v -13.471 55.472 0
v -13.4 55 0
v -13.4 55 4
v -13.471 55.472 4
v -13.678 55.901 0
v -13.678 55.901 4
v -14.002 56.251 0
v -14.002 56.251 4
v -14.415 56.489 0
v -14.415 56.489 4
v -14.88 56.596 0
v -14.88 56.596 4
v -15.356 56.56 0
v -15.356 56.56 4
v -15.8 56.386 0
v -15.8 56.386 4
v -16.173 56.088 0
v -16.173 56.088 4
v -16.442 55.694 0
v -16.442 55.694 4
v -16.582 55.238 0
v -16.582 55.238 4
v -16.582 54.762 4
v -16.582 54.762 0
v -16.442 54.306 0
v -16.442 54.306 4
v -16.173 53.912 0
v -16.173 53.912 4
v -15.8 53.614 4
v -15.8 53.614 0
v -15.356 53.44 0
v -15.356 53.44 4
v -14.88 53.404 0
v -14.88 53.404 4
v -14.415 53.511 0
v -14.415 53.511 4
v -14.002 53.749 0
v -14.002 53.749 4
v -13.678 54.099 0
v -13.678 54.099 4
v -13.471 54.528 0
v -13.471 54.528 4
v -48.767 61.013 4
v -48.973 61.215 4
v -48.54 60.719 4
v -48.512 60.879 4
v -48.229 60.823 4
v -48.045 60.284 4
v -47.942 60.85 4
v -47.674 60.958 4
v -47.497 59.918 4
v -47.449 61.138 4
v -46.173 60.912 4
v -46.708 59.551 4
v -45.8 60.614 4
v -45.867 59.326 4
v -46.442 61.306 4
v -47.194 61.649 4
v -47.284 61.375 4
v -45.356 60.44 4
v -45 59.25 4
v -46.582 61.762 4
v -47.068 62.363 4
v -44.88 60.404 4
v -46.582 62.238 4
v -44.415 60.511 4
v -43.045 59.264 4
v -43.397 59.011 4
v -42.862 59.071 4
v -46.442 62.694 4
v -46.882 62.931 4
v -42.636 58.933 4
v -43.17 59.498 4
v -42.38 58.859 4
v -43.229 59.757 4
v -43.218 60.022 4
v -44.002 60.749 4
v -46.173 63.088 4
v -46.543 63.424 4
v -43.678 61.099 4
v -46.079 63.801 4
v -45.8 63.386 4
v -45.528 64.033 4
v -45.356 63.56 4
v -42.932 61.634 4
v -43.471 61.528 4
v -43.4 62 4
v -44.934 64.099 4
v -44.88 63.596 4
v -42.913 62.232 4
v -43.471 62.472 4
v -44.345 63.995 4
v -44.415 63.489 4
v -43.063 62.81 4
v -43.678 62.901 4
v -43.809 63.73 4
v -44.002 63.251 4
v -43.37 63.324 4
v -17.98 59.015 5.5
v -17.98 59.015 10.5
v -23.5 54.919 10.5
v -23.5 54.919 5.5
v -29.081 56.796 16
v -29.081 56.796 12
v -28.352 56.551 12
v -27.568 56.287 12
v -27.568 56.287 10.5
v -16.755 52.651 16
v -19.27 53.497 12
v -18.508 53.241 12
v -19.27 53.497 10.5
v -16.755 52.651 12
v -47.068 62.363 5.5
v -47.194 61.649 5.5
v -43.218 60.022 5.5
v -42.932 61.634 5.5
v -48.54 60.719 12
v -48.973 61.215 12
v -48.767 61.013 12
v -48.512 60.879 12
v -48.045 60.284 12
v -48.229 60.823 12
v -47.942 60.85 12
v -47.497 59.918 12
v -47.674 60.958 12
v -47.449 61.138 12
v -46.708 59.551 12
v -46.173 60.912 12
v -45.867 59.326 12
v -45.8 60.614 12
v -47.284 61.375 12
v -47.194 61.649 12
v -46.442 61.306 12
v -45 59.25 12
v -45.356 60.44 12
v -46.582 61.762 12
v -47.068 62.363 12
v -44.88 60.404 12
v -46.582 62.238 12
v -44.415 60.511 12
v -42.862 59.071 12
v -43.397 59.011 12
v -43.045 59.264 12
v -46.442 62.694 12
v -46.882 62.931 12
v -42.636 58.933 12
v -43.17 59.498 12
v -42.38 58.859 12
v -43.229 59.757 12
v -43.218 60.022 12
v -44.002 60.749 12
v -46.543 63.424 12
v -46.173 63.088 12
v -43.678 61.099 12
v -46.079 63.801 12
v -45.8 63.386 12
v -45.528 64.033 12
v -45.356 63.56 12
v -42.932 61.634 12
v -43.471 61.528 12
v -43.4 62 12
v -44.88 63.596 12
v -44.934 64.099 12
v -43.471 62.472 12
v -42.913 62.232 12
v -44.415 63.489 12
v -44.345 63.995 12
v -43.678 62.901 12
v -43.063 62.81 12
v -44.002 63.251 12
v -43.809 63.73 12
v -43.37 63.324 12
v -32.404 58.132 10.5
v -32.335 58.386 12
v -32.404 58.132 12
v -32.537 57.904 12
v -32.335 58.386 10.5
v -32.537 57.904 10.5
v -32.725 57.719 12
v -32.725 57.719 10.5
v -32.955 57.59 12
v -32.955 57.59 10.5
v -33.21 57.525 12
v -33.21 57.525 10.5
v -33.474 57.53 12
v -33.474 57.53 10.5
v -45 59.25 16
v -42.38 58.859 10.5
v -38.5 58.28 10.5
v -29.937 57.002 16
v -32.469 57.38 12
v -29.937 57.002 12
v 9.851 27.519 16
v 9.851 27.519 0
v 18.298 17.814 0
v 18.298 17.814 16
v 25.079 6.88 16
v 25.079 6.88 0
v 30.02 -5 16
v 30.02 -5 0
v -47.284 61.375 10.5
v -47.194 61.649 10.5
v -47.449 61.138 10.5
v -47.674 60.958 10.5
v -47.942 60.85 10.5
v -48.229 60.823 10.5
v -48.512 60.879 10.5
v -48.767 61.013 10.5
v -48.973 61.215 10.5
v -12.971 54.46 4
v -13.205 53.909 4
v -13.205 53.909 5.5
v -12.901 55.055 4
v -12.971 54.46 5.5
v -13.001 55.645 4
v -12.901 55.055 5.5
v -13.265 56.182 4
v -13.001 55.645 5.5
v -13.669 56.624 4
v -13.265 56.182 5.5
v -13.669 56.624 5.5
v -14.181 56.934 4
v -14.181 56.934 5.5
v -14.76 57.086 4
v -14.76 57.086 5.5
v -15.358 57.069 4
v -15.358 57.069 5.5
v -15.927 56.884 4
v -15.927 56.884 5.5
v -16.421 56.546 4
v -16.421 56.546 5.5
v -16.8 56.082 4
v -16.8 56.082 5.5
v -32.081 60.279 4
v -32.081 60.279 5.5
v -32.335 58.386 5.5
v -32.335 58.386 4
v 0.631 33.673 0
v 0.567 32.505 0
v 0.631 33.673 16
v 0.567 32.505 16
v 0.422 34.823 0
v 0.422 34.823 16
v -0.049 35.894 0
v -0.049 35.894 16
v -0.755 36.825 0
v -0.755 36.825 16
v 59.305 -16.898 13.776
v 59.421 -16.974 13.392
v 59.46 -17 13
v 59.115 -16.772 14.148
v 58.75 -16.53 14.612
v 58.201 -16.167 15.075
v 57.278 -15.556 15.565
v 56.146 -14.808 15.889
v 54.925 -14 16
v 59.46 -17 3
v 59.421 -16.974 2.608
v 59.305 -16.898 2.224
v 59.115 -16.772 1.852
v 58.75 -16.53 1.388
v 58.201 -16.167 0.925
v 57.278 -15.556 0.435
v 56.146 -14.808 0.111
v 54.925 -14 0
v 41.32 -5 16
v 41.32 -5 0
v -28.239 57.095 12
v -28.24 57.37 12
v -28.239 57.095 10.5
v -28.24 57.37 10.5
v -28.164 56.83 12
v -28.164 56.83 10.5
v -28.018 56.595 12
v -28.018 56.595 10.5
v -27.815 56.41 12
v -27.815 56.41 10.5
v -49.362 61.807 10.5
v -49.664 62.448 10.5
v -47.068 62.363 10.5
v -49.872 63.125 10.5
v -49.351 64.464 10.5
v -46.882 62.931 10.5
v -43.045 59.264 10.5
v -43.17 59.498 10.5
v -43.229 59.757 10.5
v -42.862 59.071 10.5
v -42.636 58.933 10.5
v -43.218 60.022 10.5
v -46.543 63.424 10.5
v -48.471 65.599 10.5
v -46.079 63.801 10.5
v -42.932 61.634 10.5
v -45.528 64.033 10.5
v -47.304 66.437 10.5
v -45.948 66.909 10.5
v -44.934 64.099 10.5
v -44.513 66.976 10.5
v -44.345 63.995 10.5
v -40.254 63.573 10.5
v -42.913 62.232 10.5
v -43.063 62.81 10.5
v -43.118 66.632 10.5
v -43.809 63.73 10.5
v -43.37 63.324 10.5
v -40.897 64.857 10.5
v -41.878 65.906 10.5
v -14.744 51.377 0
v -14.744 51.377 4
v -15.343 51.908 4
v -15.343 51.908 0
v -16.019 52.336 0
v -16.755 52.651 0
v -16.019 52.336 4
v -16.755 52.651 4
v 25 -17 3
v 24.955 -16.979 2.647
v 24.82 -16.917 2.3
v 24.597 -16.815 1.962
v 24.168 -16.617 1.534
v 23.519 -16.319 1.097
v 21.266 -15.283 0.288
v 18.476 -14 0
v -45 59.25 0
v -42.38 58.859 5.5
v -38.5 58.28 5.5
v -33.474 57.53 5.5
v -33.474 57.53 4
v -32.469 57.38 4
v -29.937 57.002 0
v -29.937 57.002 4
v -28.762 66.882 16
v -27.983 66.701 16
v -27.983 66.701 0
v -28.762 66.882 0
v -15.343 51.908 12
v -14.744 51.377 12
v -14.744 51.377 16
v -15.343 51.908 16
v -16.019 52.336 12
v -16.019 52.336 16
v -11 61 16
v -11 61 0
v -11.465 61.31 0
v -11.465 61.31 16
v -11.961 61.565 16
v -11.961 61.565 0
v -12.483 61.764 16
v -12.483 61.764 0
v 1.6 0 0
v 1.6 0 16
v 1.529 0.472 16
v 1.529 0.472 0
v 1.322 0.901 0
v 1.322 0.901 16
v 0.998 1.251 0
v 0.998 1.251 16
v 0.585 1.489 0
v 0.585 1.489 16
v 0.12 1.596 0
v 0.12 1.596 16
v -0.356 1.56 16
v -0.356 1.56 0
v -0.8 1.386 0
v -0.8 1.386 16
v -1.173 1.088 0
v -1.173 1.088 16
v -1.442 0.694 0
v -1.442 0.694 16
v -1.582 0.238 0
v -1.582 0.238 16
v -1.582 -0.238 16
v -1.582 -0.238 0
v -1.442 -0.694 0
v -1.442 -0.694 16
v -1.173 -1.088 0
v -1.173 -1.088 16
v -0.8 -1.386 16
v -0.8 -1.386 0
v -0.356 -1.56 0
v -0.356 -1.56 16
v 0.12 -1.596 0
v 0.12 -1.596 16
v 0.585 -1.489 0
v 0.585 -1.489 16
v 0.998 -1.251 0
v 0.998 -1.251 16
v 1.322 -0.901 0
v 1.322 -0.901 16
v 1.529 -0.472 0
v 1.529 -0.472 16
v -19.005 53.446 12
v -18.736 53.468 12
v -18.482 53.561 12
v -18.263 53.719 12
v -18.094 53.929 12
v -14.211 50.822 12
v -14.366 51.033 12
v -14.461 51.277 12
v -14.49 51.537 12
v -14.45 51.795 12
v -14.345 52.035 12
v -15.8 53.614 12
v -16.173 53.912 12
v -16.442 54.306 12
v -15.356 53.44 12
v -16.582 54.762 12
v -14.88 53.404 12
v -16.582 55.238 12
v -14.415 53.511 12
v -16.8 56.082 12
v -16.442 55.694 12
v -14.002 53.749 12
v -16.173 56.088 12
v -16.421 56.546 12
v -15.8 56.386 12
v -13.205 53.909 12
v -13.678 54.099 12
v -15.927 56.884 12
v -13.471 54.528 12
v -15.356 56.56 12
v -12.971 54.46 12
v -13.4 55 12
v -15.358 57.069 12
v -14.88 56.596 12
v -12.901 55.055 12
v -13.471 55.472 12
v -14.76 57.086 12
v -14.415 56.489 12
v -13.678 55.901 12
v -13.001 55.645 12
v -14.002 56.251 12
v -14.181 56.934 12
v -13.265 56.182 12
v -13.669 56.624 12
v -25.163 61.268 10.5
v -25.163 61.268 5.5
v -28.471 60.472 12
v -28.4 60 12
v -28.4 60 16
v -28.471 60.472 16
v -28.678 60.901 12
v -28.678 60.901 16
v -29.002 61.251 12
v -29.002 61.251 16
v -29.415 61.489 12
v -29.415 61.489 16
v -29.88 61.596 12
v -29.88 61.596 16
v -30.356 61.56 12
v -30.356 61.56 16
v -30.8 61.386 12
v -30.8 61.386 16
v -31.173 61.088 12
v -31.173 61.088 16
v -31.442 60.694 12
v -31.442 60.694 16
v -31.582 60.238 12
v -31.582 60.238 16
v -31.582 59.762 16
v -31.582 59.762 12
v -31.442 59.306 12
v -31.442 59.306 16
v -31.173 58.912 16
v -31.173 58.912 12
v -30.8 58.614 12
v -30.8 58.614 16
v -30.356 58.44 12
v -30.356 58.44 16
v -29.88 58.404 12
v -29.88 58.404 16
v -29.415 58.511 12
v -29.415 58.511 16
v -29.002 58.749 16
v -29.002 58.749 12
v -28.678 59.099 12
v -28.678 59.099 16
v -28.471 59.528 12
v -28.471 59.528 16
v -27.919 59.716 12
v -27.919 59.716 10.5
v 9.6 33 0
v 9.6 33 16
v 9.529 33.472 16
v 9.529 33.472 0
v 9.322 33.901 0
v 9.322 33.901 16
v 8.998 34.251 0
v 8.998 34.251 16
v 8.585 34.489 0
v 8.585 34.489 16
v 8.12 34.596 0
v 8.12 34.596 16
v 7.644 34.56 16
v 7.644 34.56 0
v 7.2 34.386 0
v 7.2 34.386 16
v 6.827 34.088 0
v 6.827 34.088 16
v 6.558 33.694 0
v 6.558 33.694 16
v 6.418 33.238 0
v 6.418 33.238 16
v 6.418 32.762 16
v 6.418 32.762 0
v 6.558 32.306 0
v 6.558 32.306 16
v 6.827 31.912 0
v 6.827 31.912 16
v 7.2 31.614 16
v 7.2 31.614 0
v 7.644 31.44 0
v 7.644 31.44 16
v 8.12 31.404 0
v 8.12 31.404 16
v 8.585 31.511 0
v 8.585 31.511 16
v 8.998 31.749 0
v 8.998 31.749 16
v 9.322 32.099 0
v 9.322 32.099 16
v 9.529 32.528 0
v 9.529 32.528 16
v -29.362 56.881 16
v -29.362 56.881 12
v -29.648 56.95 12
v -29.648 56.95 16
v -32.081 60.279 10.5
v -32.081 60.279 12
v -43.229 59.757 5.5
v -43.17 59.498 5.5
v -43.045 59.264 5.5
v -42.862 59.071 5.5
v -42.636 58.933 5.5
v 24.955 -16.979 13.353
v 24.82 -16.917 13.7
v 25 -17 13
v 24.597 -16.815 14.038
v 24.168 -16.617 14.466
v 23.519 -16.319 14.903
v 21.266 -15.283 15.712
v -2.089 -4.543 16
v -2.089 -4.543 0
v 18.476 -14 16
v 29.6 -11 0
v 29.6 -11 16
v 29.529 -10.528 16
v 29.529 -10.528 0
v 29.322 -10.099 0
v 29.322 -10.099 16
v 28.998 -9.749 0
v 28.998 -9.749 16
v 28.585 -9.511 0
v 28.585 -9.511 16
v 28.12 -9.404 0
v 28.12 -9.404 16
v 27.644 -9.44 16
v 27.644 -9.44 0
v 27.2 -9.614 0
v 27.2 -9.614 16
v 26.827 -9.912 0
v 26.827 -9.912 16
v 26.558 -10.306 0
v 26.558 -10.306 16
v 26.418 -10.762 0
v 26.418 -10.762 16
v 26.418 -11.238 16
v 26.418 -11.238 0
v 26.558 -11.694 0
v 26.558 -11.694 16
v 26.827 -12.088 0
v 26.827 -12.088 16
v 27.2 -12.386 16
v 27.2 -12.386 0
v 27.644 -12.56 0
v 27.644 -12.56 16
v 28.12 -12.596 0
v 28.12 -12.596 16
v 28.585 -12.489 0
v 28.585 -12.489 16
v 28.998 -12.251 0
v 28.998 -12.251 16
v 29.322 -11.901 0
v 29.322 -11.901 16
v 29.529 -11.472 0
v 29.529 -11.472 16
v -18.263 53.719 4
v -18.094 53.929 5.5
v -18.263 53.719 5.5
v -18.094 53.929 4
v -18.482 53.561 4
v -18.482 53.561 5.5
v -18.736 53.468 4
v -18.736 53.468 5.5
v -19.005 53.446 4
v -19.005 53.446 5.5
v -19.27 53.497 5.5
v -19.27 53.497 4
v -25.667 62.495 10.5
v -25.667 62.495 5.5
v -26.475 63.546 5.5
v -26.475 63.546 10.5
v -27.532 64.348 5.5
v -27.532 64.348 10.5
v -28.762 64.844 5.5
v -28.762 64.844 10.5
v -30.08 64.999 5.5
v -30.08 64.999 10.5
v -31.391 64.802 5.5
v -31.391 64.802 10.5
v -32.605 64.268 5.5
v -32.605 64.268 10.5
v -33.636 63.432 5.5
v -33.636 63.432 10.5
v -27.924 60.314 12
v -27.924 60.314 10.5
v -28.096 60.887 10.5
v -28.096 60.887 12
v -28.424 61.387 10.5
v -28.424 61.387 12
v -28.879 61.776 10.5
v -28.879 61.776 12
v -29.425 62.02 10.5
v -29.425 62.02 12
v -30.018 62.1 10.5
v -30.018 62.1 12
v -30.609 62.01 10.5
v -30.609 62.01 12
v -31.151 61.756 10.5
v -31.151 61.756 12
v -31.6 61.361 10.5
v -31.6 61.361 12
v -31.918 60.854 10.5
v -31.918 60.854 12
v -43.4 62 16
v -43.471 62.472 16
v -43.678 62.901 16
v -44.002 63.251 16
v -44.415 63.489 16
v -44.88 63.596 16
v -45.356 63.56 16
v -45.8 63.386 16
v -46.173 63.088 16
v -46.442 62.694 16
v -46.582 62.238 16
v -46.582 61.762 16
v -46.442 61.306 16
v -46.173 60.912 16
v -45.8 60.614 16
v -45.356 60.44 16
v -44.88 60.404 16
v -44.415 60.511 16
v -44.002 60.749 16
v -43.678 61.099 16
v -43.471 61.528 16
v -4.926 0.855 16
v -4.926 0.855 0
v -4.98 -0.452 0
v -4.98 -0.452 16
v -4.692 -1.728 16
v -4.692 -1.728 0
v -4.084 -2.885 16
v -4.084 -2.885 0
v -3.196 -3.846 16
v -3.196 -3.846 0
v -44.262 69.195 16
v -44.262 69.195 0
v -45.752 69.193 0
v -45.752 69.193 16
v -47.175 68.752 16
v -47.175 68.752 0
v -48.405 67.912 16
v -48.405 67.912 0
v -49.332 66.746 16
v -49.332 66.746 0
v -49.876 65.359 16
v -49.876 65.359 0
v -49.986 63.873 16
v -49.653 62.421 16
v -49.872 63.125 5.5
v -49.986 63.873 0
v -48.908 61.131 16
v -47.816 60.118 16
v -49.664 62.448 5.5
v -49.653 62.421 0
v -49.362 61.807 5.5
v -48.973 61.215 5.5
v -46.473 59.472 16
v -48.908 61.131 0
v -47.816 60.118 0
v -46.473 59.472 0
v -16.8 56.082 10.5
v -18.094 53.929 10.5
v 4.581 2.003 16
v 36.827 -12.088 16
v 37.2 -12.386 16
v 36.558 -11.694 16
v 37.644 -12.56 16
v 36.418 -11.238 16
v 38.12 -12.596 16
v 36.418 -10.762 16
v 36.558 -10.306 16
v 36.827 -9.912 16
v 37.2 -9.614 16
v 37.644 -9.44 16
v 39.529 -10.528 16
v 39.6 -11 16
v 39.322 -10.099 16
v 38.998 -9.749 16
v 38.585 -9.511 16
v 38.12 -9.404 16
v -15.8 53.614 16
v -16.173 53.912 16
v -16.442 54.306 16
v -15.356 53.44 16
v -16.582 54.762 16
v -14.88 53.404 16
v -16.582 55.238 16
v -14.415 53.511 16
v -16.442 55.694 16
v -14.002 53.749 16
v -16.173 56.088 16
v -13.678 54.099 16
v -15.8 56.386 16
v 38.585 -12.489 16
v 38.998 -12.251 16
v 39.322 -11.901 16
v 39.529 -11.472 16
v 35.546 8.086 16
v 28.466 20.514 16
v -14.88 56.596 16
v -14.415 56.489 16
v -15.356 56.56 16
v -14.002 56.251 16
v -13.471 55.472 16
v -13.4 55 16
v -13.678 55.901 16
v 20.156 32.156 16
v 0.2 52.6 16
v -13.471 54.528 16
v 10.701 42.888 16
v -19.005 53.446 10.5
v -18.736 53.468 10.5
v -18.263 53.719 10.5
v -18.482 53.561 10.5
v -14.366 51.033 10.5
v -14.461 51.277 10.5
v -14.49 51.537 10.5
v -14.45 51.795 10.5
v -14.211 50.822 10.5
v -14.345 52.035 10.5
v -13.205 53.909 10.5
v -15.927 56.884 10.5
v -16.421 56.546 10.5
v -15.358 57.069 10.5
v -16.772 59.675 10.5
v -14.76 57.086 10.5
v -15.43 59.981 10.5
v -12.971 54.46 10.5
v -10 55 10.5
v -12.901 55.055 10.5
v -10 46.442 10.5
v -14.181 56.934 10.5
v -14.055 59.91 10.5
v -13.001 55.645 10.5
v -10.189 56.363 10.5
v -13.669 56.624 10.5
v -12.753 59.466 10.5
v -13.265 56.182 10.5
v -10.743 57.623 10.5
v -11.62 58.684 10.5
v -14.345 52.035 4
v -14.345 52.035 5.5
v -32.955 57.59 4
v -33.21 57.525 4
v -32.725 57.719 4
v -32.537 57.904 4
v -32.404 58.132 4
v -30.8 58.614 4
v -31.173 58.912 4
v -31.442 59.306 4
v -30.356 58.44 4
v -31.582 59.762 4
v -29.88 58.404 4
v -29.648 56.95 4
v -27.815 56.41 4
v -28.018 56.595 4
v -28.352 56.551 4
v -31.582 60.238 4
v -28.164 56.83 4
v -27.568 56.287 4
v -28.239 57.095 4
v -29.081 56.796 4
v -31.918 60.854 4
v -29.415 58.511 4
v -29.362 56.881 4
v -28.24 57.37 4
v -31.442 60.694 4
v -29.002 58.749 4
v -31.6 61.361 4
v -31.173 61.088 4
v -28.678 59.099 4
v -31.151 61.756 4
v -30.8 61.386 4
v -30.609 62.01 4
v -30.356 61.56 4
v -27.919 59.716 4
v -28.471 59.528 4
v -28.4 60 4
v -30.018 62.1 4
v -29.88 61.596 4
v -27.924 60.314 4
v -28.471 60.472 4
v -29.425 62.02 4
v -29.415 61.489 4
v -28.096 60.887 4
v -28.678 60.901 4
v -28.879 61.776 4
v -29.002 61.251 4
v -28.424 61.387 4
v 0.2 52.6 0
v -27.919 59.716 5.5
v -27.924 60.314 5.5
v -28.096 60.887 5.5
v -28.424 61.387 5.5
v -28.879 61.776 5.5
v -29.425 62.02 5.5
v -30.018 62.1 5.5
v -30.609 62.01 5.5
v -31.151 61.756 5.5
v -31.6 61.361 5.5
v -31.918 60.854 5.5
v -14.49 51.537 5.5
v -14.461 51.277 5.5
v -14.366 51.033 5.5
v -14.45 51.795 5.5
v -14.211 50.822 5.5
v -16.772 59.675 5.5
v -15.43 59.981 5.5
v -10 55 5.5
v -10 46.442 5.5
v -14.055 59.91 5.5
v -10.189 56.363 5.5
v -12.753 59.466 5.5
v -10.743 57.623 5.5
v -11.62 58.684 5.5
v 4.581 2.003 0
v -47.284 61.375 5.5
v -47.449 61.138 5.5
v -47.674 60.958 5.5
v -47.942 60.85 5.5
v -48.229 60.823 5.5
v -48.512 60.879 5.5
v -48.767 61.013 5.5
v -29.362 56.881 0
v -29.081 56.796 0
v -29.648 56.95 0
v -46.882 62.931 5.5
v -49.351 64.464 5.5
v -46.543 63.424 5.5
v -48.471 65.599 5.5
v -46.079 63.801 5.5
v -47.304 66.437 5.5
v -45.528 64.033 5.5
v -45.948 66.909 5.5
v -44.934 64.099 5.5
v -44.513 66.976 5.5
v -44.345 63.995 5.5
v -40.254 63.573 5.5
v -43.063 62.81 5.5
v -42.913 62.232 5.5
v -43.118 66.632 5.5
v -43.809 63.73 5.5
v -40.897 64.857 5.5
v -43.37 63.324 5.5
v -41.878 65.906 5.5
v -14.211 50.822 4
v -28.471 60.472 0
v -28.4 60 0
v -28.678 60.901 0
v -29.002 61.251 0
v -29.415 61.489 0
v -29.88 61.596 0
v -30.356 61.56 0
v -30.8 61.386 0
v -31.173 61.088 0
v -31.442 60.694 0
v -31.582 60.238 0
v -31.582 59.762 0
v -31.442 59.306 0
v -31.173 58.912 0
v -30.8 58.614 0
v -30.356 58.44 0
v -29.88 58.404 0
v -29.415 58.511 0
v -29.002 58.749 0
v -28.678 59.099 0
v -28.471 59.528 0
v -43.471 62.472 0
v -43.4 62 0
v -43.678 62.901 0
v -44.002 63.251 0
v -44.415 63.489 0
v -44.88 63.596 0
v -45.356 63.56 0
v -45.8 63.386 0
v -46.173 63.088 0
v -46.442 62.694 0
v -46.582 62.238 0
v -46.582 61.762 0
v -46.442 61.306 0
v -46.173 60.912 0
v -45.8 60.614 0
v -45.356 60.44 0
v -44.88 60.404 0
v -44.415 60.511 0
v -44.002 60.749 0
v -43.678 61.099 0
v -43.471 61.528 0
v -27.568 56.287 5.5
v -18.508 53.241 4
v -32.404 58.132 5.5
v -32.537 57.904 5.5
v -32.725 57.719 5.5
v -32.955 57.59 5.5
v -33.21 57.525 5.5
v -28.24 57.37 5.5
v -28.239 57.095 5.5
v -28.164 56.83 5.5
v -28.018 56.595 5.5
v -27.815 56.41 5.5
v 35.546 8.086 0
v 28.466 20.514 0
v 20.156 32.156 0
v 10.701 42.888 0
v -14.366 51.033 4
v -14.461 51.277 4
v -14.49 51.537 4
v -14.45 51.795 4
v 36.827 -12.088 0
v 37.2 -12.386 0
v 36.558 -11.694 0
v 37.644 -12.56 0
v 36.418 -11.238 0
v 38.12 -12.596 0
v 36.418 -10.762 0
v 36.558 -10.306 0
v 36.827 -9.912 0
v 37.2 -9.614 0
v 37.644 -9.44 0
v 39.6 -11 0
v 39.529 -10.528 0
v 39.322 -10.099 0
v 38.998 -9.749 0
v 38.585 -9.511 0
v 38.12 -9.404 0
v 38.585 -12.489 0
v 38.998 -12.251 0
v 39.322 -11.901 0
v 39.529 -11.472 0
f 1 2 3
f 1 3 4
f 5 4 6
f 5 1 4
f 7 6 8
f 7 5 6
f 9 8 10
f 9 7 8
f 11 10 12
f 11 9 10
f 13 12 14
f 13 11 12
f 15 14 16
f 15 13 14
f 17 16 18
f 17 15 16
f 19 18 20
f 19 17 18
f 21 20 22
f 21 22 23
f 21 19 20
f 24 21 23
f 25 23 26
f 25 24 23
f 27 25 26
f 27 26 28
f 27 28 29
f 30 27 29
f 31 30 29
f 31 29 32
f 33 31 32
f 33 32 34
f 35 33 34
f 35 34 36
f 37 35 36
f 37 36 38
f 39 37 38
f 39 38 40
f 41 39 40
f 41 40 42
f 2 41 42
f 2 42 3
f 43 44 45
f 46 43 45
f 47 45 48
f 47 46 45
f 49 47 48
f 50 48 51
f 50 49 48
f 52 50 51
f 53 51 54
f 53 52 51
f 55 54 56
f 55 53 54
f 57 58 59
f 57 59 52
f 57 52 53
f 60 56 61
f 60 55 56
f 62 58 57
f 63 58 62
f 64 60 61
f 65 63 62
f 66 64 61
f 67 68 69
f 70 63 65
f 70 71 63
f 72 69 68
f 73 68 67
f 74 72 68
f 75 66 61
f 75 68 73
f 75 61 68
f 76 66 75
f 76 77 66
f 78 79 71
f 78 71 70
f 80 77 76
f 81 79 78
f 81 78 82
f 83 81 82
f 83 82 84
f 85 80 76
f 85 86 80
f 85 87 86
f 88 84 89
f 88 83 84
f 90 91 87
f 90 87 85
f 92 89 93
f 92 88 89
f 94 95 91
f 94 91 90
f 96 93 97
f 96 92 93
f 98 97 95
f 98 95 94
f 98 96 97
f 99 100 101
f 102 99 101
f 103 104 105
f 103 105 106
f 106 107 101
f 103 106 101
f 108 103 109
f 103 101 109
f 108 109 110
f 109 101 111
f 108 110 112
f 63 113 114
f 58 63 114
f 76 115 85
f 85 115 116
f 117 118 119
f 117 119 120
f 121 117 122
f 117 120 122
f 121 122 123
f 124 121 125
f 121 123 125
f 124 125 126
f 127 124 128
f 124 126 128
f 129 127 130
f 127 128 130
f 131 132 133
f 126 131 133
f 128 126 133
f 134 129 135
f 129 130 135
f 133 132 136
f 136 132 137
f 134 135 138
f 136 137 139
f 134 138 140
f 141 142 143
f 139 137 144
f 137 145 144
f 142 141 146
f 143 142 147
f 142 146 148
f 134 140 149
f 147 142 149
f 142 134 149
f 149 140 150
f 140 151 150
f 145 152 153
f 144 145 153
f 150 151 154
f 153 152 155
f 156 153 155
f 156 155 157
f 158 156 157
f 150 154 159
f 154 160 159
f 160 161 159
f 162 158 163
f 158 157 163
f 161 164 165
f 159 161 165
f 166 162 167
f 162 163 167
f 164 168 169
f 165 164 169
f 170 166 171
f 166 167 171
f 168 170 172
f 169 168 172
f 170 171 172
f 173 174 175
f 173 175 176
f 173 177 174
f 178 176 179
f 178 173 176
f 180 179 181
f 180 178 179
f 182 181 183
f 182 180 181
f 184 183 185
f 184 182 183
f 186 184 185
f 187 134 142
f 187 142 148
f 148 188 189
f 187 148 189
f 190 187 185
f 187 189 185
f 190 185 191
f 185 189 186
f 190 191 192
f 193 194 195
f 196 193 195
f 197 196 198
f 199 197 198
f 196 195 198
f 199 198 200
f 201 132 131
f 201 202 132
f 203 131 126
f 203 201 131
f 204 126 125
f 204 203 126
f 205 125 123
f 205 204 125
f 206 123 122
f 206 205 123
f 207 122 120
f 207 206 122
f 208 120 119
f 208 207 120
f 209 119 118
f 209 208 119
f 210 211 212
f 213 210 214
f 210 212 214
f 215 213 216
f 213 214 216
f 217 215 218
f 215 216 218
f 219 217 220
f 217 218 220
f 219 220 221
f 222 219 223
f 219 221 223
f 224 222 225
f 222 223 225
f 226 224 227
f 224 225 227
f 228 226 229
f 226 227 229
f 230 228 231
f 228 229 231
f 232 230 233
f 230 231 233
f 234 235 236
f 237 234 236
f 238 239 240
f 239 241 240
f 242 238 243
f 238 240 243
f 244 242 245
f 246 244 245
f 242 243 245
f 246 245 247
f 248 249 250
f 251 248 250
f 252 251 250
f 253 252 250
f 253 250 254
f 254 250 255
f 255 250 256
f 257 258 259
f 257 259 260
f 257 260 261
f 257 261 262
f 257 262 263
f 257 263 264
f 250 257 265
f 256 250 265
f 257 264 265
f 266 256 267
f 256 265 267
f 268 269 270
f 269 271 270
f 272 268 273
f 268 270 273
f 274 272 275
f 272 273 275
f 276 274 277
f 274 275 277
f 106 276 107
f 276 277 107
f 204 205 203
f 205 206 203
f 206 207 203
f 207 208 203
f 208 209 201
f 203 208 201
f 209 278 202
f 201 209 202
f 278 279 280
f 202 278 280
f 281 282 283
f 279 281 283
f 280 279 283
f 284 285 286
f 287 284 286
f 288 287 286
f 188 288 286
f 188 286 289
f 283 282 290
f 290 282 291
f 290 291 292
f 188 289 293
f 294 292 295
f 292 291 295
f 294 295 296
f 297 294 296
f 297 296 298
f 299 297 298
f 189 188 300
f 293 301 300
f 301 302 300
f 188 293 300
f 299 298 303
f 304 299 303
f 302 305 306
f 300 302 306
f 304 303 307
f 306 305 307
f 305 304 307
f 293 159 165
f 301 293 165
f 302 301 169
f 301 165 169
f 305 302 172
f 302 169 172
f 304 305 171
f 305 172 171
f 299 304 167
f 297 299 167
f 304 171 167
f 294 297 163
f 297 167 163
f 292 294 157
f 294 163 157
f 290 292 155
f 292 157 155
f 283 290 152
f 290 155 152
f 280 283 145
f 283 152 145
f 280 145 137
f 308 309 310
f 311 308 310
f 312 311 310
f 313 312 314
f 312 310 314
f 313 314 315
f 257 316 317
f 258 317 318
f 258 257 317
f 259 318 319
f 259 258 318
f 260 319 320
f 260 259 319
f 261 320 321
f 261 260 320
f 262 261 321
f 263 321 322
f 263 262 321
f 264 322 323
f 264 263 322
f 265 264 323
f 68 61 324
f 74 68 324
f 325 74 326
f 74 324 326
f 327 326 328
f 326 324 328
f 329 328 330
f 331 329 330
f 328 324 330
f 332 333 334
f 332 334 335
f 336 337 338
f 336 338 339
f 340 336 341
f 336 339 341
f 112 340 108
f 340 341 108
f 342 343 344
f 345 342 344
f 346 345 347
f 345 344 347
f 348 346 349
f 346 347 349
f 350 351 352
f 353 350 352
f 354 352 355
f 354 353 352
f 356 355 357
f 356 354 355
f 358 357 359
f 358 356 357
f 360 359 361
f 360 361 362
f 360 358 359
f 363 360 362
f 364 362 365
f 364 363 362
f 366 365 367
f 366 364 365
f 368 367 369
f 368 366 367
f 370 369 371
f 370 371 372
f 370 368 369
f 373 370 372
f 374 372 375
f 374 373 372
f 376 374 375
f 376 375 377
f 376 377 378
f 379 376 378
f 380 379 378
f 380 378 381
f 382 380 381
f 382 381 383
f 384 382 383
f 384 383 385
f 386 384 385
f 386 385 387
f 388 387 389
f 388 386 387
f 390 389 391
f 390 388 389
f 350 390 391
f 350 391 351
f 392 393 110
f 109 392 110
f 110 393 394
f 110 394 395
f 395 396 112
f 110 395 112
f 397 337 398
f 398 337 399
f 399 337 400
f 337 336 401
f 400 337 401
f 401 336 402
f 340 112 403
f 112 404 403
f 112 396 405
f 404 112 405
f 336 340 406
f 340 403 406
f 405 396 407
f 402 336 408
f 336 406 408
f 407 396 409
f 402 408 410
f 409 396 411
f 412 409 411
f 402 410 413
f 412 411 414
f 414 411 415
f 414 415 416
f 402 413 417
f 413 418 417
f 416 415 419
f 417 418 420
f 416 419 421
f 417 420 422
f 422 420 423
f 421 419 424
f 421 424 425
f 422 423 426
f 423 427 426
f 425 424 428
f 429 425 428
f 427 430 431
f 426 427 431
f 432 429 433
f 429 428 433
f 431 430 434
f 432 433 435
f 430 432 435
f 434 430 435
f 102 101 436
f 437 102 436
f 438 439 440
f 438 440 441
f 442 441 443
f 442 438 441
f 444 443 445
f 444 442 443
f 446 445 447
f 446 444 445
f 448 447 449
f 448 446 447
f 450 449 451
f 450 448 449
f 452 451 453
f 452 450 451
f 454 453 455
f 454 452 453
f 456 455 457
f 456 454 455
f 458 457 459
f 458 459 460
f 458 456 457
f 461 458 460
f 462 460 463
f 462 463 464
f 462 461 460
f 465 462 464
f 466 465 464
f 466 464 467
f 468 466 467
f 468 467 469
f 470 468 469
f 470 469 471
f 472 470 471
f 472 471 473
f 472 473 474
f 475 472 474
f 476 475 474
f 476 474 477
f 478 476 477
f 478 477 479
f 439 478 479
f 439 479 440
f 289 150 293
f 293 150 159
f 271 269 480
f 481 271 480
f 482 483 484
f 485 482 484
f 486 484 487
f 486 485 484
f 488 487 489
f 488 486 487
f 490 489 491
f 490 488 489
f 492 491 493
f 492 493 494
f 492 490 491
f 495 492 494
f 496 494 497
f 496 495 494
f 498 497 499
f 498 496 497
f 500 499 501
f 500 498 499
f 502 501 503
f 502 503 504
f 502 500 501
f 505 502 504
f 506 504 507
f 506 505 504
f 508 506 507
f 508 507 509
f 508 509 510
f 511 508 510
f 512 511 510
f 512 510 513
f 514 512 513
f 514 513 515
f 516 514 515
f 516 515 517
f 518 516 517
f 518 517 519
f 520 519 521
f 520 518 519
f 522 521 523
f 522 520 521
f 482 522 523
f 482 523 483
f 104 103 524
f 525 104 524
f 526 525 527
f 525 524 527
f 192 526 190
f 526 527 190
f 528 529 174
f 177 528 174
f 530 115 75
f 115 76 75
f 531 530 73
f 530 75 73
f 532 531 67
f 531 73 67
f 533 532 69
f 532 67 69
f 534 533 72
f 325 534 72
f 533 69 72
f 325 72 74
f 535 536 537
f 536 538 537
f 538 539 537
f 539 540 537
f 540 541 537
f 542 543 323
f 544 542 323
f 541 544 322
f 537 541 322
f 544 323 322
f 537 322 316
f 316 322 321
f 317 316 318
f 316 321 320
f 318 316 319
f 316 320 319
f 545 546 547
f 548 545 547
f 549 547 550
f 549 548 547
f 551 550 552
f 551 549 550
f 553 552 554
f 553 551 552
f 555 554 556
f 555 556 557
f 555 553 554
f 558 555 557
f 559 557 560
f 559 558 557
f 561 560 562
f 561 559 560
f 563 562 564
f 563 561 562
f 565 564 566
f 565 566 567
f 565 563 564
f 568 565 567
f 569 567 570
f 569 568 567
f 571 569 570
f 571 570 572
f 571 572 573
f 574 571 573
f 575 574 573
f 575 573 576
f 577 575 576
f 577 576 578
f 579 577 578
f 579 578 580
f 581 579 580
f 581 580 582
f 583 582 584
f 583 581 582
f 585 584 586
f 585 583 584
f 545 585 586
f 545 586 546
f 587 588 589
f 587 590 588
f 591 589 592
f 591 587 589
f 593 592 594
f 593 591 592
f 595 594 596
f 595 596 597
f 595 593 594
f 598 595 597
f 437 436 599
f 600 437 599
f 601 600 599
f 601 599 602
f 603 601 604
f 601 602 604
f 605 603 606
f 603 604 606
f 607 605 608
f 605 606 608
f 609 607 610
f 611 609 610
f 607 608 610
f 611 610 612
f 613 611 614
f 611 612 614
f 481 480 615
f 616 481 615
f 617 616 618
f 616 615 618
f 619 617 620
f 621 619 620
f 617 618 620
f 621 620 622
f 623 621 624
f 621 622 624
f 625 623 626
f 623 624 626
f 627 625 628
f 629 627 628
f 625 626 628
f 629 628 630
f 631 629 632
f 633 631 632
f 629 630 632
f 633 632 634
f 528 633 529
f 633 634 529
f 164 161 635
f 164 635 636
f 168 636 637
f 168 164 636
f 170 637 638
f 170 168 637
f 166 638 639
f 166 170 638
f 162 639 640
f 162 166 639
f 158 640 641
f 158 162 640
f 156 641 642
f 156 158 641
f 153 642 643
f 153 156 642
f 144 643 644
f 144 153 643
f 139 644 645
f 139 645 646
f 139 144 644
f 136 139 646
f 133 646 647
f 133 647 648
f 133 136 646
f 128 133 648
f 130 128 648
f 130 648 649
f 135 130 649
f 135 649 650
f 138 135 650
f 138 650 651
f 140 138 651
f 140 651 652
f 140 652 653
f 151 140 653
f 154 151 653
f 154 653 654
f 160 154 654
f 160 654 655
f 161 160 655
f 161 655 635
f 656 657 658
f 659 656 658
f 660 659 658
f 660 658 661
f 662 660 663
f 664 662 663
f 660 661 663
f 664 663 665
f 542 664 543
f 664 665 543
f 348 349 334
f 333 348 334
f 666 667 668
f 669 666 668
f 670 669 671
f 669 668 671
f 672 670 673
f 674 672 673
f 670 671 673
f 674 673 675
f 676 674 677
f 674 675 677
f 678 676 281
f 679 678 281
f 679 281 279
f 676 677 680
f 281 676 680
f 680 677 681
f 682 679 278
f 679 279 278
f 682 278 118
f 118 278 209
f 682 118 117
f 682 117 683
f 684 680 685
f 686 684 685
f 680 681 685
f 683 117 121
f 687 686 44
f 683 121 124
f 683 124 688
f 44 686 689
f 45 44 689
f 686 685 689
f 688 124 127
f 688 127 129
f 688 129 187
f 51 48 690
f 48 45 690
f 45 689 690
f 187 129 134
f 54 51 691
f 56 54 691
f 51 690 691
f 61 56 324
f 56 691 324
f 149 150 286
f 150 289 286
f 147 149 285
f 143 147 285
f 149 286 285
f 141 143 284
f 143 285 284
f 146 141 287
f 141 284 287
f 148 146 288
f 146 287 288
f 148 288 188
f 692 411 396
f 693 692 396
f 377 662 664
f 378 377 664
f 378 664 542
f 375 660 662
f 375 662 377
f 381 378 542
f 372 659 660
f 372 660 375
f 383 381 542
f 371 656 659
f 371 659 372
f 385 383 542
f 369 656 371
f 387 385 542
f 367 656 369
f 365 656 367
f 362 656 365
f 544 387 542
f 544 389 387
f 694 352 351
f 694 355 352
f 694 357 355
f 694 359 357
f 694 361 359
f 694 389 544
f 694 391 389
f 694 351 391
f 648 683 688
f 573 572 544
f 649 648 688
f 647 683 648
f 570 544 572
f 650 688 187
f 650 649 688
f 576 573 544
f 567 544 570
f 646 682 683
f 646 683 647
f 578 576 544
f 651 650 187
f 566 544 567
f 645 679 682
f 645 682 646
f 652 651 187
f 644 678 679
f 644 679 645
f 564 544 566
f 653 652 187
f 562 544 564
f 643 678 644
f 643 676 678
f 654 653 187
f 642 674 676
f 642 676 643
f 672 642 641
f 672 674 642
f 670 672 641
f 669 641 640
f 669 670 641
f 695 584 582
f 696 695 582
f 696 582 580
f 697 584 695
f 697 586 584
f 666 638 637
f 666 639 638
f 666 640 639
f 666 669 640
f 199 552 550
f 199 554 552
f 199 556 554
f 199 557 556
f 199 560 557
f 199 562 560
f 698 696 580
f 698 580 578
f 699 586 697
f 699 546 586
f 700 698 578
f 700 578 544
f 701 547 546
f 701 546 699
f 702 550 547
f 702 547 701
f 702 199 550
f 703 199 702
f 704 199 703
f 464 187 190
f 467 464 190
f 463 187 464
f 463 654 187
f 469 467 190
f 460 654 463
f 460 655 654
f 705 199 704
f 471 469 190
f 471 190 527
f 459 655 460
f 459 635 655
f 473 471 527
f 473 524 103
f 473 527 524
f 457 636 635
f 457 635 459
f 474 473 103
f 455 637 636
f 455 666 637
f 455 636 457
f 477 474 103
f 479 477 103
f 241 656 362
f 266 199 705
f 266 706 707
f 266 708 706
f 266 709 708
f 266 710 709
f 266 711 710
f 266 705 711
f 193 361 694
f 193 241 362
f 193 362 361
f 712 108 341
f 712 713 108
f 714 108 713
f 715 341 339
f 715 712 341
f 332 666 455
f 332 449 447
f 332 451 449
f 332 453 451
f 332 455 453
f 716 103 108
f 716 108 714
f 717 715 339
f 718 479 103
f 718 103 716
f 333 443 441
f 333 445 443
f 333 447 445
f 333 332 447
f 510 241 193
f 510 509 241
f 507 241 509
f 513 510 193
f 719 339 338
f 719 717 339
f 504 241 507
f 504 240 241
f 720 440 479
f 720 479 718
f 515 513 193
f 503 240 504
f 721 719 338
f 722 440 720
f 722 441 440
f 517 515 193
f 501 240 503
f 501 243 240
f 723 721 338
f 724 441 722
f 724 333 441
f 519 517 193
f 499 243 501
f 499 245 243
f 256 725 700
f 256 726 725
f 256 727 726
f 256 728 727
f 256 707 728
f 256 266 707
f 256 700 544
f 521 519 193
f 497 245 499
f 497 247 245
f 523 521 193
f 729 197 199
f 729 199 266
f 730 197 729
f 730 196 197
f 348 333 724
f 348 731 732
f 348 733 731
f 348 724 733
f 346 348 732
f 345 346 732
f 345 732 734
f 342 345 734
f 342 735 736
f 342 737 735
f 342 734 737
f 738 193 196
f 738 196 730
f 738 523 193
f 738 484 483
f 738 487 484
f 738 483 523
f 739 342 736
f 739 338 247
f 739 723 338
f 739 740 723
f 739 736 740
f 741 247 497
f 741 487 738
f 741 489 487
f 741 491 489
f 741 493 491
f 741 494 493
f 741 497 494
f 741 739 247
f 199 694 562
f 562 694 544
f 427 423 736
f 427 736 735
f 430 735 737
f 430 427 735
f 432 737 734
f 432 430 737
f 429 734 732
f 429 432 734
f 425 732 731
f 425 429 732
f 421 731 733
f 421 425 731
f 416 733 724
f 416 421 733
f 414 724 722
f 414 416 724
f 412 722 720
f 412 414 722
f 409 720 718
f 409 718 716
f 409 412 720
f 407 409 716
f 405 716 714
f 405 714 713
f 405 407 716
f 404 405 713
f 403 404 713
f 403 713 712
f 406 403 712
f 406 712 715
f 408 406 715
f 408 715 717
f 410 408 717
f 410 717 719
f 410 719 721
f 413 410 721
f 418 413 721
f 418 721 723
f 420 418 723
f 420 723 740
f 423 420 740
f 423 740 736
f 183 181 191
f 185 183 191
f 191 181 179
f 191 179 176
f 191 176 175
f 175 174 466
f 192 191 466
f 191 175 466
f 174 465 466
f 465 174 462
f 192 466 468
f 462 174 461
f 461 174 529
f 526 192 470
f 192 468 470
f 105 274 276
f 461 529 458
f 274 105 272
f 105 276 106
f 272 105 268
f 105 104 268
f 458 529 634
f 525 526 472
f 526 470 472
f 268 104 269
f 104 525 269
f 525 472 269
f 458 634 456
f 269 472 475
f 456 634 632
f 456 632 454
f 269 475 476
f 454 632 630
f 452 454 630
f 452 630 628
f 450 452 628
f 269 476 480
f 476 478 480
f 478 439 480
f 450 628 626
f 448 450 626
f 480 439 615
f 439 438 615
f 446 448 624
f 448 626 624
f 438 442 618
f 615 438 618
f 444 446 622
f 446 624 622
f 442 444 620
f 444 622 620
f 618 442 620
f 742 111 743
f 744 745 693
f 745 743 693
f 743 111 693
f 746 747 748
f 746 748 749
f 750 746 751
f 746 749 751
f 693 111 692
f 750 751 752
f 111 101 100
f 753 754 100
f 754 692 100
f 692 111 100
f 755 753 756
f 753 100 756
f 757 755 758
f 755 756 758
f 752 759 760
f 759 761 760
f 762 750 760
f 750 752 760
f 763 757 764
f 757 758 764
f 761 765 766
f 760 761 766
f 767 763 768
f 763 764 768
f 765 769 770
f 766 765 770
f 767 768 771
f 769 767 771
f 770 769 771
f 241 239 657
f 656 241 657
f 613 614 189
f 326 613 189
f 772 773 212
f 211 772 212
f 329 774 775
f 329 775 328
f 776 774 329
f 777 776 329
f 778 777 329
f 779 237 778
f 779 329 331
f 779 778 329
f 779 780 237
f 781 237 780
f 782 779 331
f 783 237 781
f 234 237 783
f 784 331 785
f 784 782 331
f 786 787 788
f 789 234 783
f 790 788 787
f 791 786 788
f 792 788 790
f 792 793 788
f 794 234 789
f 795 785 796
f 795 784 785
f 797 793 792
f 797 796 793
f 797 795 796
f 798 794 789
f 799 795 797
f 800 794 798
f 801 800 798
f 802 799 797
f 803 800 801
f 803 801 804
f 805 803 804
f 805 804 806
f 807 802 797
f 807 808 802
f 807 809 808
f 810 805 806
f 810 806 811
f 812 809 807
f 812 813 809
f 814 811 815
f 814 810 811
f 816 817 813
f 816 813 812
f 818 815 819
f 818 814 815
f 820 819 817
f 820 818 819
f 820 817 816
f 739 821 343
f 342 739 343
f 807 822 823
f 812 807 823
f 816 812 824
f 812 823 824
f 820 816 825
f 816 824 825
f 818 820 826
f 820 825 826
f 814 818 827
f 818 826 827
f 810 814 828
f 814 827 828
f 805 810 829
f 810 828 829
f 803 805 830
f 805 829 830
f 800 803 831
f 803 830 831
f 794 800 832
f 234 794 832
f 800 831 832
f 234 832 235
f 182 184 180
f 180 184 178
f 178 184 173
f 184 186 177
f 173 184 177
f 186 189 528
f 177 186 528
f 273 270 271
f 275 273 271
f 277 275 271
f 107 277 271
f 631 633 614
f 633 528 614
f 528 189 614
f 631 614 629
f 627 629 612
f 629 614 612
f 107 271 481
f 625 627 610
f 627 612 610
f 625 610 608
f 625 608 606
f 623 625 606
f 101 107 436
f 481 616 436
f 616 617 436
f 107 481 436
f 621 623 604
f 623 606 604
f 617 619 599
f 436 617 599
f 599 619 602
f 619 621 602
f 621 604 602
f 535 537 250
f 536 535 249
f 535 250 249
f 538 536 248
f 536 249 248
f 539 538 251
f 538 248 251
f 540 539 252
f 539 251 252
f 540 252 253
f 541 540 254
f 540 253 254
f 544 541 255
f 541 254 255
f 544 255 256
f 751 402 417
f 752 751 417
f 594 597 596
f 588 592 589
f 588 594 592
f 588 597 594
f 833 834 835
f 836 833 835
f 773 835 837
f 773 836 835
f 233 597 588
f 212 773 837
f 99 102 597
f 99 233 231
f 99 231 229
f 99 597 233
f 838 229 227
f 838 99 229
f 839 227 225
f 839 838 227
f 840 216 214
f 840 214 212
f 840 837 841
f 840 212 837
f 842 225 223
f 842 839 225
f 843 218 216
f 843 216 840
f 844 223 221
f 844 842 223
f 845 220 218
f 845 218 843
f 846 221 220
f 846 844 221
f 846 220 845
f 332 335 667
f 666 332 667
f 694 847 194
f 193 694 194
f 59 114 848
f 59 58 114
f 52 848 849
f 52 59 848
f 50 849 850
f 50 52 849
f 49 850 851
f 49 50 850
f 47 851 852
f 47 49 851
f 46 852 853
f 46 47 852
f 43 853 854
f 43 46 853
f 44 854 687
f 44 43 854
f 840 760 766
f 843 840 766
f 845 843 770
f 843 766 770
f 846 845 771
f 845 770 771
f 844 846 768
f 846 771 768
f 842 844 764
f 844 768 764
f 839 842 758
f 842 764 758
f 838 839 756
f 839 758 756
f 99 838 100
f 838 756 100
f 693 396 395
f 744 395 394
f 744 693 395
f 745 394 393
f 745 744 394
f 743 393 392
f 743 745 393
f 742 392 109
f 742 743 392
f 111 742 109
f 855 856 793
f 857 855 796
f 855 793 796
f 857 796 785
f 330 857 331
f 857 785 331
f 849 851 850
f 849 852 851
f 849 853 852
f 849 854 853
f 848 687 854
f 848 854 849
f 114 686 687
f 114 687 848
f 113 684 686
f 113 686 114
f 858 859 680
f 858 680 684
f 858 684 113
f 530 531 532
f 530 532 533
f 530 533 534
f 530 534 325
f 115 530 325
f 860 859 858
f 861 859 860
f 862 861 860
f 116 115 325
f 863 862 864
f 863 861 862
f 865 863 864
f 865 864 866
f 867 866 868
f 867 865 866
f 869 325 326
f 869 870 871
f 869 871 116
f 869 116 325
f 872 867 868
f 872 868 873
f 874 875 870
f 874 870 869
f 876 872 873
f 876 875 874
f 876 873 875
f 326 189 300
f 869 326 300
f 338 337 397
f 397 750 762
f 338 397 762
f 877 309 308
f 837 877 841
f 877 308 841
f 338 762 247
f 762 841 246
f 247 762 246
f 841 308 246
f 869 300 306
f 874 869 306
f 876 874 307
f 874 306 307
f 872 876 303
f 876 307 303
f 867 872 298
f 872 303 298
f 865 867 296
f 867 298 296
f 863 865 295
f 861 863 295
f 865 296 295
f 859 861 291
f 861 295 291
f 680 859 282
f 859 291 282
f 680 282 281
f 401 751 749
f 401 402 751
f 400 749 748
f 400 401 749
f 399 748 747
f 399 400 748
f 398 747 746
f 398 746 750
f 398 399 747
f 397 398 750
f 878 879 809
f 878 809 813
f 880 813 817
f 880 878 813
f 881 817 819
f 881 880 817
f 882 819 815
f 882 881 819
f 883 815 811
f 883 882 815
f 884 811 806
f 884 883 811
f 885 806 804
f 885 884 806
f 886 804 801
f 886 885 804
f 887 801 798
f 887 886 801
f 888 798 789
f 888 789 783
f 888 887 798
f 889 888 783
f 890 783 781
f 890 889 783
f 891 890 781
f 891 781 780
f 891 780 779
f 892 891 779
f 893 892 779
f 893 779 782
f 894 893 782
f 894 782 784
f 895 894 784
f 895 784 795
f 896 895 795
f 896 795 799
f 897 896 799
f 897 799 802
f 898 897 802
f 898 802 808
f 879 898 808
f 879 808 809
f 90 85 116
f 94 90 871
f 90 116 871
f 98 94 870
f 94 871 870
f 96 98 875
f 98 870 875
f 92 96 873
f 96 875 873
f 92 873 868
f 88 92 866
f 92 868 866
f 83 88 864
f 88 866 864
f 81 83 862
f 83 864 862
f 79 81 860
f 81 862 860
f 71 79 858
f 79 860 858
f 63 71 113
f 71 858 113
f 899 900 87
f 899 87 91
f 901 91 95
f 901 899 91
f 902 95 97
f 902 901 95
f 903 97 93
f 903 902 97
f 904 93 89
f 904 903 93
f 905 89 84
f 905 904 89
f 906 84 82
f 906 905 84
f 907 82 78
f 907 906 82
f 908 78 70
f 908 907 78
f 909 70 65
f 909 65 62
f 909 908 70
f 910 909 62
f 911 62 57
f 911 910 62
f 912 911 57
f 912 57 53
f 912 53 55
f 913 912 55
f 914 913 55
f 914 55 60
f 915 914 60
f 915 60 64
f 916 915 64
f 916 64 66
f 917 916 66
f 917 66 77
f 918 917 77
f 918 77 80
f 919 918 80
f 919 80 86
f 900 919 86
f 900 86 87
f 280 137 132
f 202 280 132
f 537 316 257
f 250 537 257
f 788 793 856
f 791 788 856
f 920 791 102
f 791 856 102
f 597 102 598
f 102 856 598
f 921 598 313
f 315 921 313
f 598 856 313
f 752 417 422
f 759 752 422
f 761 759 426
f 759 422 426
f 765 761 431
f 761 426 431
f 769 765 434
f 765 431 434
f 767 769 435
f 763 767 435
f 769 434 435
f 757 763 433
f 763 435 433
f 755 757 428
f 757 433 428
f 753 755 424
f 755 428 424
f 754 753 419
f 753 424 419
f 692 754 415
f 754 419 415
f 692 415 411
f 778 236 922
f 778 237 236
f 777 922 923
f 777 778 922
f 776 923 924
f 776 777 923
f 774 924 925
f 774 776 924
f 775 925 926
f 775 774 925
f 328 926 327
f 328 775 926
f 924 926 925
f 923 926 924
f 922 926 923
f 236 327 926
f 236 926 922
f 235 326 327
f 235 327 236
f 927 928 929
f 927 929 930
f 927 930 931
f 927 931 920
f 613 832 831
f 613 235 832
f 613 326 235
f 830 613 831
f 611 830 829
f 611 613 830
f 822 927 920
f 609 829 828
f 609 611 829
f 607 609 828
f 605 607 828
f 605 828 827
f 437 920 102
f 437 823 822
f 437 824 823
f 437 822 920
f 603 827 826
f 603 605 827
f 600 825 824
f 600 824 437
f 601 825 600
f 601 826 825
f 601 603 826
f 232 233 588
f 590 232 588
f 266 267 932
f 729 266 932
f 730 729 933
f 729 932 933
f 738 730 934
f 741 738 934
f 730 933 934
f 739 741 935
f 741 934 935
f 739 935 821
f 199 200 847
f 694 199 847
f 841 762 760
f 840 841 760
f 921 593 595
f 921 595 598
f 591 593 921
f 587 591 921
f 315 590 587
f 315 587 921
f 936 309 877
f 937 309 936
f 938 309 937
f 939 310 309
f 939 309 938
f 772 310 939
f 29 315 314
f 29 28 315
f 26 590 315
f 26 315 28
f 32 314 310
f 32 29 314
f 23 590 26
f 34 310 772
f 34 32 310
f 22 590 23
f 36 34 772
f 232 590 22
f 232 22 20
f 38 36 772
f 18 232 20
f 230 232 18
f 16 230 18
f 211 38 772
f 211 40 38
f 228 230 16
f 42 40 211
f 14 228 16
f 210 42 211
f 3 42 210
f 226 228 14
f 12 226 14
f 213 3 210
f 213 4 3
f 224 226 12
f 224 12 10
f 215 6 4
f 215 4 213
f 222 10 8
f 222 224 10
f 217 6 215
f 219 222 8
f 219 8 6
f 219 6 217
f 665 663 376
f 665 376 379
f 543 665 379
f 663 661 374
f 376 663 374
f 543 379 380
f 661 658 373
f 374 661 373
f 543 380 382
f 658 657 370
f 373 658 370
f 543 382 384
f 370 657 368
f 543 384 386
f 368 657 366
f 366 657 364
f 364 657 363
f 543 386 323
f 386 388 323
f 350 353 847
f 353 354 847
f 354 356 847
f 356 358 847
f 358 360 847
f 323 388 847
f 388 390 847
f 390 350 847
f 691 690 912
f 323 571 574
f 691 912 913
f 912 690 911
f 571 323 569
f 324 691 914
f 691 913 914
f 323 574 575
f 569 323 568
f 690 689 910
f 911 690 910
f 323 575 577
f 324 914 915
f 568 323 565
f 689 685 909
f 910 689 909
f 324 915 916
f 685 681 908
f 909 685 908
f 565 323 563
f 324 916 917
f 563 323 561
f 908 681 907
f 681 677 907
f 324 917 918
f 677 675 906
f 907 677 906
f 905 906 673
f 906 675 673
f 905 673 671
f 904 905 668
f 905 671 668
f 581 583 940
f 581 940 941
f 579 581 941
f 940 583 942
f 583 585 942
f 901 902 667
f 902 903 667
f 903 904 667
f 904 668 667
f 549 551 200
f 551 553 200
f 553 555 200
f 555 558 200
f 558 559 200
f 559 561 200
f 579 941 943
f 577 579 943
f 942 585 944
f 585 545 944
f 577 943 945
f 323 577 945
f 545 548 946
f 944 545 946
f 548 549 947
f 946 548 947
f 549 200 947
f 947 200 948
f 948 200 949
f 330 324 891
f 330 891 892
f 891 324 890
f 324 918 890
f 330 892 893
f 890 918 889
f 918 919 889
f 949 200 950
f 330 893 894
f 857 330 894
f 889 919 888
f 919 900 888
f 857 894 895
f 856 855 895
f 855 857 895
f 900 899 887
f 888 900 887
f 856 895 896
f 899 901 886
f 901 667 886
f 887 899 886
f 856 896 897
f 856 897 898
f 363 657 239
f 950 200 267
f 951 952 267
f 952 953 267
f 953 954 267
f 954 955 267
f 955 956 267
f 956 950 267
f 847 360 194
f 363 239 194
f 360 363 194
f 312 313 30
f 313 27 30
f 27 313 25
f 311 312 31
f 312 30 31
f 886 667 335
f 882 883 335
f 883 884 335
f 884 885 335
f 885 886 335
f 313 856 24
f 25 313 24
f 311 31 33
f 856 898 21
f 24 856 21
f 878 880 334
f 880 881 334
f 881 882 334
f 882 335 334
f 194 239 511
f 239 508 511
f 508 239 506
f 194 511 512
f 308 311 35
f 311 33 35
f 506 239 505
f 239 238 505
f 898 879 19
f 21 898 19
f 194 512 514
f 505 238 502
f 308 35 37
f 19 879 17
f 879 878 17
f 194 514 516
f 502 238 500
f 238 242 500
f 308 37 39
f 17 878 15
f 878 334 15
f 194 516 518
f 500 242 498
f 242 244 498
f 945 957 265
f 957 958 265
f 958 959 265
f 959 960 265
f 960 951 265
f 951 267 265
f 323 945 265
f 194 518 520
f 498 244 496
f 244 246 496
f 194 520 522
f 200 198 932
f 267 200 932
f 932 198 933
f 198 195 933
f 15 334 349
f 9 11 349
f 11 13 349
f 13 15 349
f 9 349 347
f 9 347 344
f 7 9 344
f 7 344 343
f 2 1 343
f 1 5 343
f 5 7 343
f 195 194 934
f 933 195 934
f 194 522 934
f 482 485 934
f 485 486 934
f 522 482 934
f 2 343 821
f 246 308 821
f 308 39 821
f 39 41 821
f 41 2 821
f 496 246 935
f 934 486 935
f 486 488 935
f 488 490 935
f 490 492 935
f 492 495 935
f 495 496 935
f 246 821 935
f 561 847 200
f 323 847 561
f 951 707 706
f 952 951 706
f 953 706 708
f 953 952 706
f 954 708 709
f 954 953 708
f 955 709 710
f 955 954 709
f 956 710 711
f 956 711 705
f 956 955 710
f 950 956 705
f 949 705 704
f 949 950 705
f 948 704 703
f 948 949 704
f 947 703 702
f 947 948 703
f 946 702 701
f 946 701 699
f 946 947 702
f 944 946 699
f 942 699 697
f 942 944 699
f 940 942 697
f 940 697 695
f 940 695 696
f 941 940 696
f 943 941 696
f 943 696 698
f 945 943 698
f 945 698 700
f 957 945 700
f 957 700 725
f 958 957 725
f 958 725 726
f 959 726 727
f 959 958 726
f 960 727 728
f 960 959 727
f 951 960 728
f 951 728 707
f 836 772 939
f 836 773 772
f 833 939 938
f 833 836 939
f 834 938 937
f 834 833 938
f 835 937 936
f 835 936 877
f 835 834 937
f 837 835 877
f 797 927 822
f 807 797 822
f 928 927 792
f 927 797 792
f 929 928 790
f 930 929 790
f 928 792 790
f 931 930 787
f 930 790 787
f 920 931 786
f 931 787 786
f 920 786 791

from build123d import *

# Parameters (mm, degrees)
SKETCH1_R           = 1.6
BOSS_EXTRUDE1_DEPTH = 16
FILLET1_R           = 3
FILLET2_R           = 5
CUT_EXTRUDE1_START  = -5.5
SKETCH2_R           = 2.1
SKETCH2_R_2         = 1.6
CUT_EXTRUDE1_DEPTH  = 5
CUT_EXTRUDE2_START  = -4
SKETCH2_4_R         = 1.6
CUT_EXTRUDE2_DEPTH  = 8
FILLET3_R           = 1


with BuildPart() as part:
    # Sketch1 → Boss-Extrude1 (new body)
    with BuildSketch(Plane.XY):
        with BuildLine():
            Line((59.46, -17), (41.32, -5))
            ThreePointArc((41.32, -5), (24.459745553, 26.441207242), (0.2, 52.6))
            Line((0.2, 52.6), (-11, 61))
            ThreePointArc((-11, 61), (-11.709245402, 61.444372101), (-12.482677345, 61.764213677))
            Line((-12.482677345, 61.764213677), (-27.982677345, 66.70070535))
            Line((-27.982677345, 66.70070535), (-28.761883628, 66.881709992))
            Line((-28.761883628, 66.881709992), (-44.261883628, 69.195218319))
            ThreePointArc((-44.261883628, 69.195218319), (-49.986285772, 64.62007324), (-45, 59.25))
            Line((-45, 59.25), (-29.5, 56.936491673))
            Line((-29.5, 56.936491673), (-15.593484906, 52.260716736))
            Line((-15.593484906, 52.260716736), (1, 35))
            Line((1, 35), (-4.926348457, 0.855038527))
            ThreePointArc((-4.926348457, 0.855038527), (-4.425801292, -2.326431372), (-2.089024899, -4.542683675))
            Line((-2.089024899, -4.542683675), (25, -17))
            Line((25, -17), (59.46, -17))
        make_face()
        with Locations((28, -11)):
            Circle(SKETCH1_R, mode=Mode.SUBTRACT)
        with Locations((38, -11)):
            Circle(SKETCH1_R, mode=Mode.SUBTRACT)
        with BuildLine():
            Line((30.019916022, -5), (4.581128304, 2.00331312))
            Line((4.581128304, 2.00331312), (9.851129428, 27.519340358))
            ThreePointArc((9.851129428, 27.519340358), (21.90850327, 12.483330411), (30.019916022, -5))
        make_face(mode=Mode.SUBTRACT)
        with Locations((-45, 62)):
            Circle(SKETCH1_R, mode=Mode.SUBTRACT)
        with Locations((-30, 60)):
            Circle(SKETCH1_R, mode=Mode.SUBTRACT)
        with Locations((-15, 55)):
            Circle(SKETCH1_R, mode=Mode.SUBTRACT)
        with Locations((8, 33)):
            Circle(SKETCH1_R, mode=Mode.SUBTRACT)
        Circle(SKETCH1_R, mode=Mode.SUBTRACT)
    extrude(amount=BOSS_EXTRUDE1_DEPTH)

    # Fillet1
    fillet1_edges = [part.edges().sort_by_distance(p)[0] for p in [
        (42.23, -17, 0),
        (42.23, -17, 16),
    ]]
    fillet(fillet1_edges, radius=FILLET1_R)

    # Fillet2
    fillet2_edges = [part.edges().sort_by_distance(p)[0] for p in [
        (1, 35, 8),
        (-15.593484906, 52.260716736, 8),
        (-29.5, 56.936491673, 8),
    ]]
    fillet(fillet2_edges, radius=FILLET2_R)

    # Sketch2 → Cut-Extrude1 (cut)
    # profile 1 of 3: a face of its own
    with BuildSketch(Plane.XY.offset(16).offset(CUT_EXTRUDE1_START)):
        with BuildLine():
            Line((-23.499613929, 54.918987315), (-16.755150829, 52.651302614))
            ThreePointArc((-16.755150829, 52.651302614), (-15.672698928, 52.135686265), (-14.744120066, 51.377198536))
            Line((-14.744120066, 51.377198536), (-10, 46.442315172))
            Line((-10, 46.442315172), (-10, 55))
            ThreePointArc((-10, 55), (-12.752546223, 59.466424915), (-17.979580608, 59.015233418))
            Line((-17.979580608, 59.015233418), (-23.499613929, 54.918987315))
        make_face()
        with Locations((-15, 55)):
            Circle(SKETCH2_R, mode=Mode.SUBTRACT)
    # profile 2 of 3: a face of its own
    with BuildSketch(Plane.XY.offset(16).offset(CUT_EXTRUDE1_START)):
        with BuildLine():
            Line((-23.499613929, 54.918987315), (-25.163326304, 61.267512349))
            ThreePointArc((-25.163326304, 61.267512349), (-28.762198184, 64.844362359), (-33.635794756, 63.432345625))
            Line((-33.635794756, 63.432345625), (-38.5, 58.279819089))
            Line((-38.5, 58.279819089), (-29.936778714, 57.001684653))
            ThreePointArc((-29.936778714, 57.001684653), (-29.504556057, 56.917567707), (-29.081410179, 56.795749598))
            Line((-29.081410179, 56.795749598), (-23.499613929, 54.918987315))
        make_face()
        with Locations((-30, 60)):
            Circle(SKETCH2_R_2, mode=Mode.SUBTRACT)
    # profile 3 of 3: a face of its own
    with BuildSketch(Plane.XY.offset(16).offset(CUT_EXTRUDE1_START)):
        with BuildLine():
            Line((-38.5, 58.279819089), (-40.253762465, 63.572650394))
            ThreePointArc((-40.253762465, 63.572650394), (-45.2324625, 66.994593195), (-49.871793817, 63.125))
            ThreePointArc((-49.871793817, 63.125), (-48.112474899, 60.336881039), (-45, 59.25))
            Line((-45, 59.25), (-38.5, 58.279819089))
        make_face()
        with Locations((-45, 62)):
            Circle(SKETCH2_R, mode=Mode.SUBTRACT)
    extrude(amount=-CUT_EXTRUDE1_DEPTH, mode=Mode.SUBTRACT)

    # Sketch2<4> → Cut-Extrude2 (cut)
    # profile 1 of 3: a face of its own
    with BuildSketch(Plane.XY.offset(16).offset(CUT_EXTRUDE2_START)):
        with BuildLine():
            Line((-16.799757531, 56.082068773), (-18.50808127, 53.240688824))
            Line((-18.50808127, 53.240688824), (-16.755150829, 52.651302614))
            ThreePointArc((-16.755150829, 52.651302614), (-15.672698928, 52.135686265), (-14.744120066, 51.377198536))
            Line((-14.744120066, 51.377198536), (-13.205359072, 53.909466214))
            ThreePointArc((-13.205359072, 53.909466214), (-13.913695708, 56.797204214), (-16.799757531, 56.082068773))
        make_face()
        with Locations((-15, 55)):
            Circle(SKETCH2_4_R, mode=Mode.SUBTRACT)
    # profile 2 of 3: a face of its own
    with BuildSketch(Plane.XY.offset(16).offset(CUT_EXTRUDE2_START)):
        with BuildLine():
            Line((-29.081410179, 56.795749598), (-28.352112311, 56.550538438))
            Line((-28.352112311, 56.550538438), (-27.919359393, 59.715509815))
            ThreePointArc((-27.919359393, 59.715509815), (-29.718455545, 62.081041259), (-32.08143774, 60.27859816))
            Line((-32.08143774, 60.27859816), (-32.469451039, 57.379707783))
            Line((-32.469451039, 57.379707783), (-29.936778714, 57.001684653))
            ThreePointArc((-29.936778714, 57.001684653), (-29.504556057, 56.917567707), (-29.081410179, 56.795749598))
        make_face()
        with Locations((-30, 60)):
            Circle(SKETCH2_4_R, mode=Mode.SUBTRACT)
    # profile 3 of 3: a face of its own
    with BuildSketch(Plane.XY.offset(16).offset(CUT_EXTRUDE2_START)):
        with BuildLine():
            Line((-45, 59.25), (-43.396661475, 59.010687934))
            Line((-43.396661475, 59.010687934), (-42.932168542, 61.633840116))
            ThreePointArc((-42.932168542, 61.633840116), (-44.635424811, 64.068111441), (-47.068390209, 62.36299028))
            Line((-47.068390209, 62.36299028), (-47.497405572, 59.918376123))
            ThreePointArc((-47.497405572, 59.918376123), (-46.292648563, 59.419983469), (-45, 59.25))
        make_face()
        with Locations((-45, 62)):
            Circle(SKETCH2_4_R, mode=Mode.SUBTRACT)
    extrude(amount=-CUT_EXTRUDE2_DEPTH, mode=Mode.SUBTRACT)

    # Fillet3
    fillet3_edges = [part.edges().sort_by_distance(p)[0] for p in [
        (-14.744120066, 51.377198536, 4.75),
        (-14.744120066, 51.377198536, 11.25),
        (-18.50808127, 53.240688824, 11.25),
        (-18.50808127, 53.240688824, 4.75),
        (-43.396661475, 59.010687934, 11.25),
        (-47.497405572, 59.918376123, 11.25),
        (-43.396661475, 59.010687934, 4.75),
        (-47.497405572, 59.918376123, 4.75),
        (-28.352112311, 56.550538438, 11.25),
        (-32.469451039, 57.379707783, 11.25),
        (-28.352112311, 56.550538438, 4.75),
        (-32.469451039, 57.379707783, 4.75),
    ]]
    fillet(fillet3_edges, radius=FILLET3_R)


solid = part.part
